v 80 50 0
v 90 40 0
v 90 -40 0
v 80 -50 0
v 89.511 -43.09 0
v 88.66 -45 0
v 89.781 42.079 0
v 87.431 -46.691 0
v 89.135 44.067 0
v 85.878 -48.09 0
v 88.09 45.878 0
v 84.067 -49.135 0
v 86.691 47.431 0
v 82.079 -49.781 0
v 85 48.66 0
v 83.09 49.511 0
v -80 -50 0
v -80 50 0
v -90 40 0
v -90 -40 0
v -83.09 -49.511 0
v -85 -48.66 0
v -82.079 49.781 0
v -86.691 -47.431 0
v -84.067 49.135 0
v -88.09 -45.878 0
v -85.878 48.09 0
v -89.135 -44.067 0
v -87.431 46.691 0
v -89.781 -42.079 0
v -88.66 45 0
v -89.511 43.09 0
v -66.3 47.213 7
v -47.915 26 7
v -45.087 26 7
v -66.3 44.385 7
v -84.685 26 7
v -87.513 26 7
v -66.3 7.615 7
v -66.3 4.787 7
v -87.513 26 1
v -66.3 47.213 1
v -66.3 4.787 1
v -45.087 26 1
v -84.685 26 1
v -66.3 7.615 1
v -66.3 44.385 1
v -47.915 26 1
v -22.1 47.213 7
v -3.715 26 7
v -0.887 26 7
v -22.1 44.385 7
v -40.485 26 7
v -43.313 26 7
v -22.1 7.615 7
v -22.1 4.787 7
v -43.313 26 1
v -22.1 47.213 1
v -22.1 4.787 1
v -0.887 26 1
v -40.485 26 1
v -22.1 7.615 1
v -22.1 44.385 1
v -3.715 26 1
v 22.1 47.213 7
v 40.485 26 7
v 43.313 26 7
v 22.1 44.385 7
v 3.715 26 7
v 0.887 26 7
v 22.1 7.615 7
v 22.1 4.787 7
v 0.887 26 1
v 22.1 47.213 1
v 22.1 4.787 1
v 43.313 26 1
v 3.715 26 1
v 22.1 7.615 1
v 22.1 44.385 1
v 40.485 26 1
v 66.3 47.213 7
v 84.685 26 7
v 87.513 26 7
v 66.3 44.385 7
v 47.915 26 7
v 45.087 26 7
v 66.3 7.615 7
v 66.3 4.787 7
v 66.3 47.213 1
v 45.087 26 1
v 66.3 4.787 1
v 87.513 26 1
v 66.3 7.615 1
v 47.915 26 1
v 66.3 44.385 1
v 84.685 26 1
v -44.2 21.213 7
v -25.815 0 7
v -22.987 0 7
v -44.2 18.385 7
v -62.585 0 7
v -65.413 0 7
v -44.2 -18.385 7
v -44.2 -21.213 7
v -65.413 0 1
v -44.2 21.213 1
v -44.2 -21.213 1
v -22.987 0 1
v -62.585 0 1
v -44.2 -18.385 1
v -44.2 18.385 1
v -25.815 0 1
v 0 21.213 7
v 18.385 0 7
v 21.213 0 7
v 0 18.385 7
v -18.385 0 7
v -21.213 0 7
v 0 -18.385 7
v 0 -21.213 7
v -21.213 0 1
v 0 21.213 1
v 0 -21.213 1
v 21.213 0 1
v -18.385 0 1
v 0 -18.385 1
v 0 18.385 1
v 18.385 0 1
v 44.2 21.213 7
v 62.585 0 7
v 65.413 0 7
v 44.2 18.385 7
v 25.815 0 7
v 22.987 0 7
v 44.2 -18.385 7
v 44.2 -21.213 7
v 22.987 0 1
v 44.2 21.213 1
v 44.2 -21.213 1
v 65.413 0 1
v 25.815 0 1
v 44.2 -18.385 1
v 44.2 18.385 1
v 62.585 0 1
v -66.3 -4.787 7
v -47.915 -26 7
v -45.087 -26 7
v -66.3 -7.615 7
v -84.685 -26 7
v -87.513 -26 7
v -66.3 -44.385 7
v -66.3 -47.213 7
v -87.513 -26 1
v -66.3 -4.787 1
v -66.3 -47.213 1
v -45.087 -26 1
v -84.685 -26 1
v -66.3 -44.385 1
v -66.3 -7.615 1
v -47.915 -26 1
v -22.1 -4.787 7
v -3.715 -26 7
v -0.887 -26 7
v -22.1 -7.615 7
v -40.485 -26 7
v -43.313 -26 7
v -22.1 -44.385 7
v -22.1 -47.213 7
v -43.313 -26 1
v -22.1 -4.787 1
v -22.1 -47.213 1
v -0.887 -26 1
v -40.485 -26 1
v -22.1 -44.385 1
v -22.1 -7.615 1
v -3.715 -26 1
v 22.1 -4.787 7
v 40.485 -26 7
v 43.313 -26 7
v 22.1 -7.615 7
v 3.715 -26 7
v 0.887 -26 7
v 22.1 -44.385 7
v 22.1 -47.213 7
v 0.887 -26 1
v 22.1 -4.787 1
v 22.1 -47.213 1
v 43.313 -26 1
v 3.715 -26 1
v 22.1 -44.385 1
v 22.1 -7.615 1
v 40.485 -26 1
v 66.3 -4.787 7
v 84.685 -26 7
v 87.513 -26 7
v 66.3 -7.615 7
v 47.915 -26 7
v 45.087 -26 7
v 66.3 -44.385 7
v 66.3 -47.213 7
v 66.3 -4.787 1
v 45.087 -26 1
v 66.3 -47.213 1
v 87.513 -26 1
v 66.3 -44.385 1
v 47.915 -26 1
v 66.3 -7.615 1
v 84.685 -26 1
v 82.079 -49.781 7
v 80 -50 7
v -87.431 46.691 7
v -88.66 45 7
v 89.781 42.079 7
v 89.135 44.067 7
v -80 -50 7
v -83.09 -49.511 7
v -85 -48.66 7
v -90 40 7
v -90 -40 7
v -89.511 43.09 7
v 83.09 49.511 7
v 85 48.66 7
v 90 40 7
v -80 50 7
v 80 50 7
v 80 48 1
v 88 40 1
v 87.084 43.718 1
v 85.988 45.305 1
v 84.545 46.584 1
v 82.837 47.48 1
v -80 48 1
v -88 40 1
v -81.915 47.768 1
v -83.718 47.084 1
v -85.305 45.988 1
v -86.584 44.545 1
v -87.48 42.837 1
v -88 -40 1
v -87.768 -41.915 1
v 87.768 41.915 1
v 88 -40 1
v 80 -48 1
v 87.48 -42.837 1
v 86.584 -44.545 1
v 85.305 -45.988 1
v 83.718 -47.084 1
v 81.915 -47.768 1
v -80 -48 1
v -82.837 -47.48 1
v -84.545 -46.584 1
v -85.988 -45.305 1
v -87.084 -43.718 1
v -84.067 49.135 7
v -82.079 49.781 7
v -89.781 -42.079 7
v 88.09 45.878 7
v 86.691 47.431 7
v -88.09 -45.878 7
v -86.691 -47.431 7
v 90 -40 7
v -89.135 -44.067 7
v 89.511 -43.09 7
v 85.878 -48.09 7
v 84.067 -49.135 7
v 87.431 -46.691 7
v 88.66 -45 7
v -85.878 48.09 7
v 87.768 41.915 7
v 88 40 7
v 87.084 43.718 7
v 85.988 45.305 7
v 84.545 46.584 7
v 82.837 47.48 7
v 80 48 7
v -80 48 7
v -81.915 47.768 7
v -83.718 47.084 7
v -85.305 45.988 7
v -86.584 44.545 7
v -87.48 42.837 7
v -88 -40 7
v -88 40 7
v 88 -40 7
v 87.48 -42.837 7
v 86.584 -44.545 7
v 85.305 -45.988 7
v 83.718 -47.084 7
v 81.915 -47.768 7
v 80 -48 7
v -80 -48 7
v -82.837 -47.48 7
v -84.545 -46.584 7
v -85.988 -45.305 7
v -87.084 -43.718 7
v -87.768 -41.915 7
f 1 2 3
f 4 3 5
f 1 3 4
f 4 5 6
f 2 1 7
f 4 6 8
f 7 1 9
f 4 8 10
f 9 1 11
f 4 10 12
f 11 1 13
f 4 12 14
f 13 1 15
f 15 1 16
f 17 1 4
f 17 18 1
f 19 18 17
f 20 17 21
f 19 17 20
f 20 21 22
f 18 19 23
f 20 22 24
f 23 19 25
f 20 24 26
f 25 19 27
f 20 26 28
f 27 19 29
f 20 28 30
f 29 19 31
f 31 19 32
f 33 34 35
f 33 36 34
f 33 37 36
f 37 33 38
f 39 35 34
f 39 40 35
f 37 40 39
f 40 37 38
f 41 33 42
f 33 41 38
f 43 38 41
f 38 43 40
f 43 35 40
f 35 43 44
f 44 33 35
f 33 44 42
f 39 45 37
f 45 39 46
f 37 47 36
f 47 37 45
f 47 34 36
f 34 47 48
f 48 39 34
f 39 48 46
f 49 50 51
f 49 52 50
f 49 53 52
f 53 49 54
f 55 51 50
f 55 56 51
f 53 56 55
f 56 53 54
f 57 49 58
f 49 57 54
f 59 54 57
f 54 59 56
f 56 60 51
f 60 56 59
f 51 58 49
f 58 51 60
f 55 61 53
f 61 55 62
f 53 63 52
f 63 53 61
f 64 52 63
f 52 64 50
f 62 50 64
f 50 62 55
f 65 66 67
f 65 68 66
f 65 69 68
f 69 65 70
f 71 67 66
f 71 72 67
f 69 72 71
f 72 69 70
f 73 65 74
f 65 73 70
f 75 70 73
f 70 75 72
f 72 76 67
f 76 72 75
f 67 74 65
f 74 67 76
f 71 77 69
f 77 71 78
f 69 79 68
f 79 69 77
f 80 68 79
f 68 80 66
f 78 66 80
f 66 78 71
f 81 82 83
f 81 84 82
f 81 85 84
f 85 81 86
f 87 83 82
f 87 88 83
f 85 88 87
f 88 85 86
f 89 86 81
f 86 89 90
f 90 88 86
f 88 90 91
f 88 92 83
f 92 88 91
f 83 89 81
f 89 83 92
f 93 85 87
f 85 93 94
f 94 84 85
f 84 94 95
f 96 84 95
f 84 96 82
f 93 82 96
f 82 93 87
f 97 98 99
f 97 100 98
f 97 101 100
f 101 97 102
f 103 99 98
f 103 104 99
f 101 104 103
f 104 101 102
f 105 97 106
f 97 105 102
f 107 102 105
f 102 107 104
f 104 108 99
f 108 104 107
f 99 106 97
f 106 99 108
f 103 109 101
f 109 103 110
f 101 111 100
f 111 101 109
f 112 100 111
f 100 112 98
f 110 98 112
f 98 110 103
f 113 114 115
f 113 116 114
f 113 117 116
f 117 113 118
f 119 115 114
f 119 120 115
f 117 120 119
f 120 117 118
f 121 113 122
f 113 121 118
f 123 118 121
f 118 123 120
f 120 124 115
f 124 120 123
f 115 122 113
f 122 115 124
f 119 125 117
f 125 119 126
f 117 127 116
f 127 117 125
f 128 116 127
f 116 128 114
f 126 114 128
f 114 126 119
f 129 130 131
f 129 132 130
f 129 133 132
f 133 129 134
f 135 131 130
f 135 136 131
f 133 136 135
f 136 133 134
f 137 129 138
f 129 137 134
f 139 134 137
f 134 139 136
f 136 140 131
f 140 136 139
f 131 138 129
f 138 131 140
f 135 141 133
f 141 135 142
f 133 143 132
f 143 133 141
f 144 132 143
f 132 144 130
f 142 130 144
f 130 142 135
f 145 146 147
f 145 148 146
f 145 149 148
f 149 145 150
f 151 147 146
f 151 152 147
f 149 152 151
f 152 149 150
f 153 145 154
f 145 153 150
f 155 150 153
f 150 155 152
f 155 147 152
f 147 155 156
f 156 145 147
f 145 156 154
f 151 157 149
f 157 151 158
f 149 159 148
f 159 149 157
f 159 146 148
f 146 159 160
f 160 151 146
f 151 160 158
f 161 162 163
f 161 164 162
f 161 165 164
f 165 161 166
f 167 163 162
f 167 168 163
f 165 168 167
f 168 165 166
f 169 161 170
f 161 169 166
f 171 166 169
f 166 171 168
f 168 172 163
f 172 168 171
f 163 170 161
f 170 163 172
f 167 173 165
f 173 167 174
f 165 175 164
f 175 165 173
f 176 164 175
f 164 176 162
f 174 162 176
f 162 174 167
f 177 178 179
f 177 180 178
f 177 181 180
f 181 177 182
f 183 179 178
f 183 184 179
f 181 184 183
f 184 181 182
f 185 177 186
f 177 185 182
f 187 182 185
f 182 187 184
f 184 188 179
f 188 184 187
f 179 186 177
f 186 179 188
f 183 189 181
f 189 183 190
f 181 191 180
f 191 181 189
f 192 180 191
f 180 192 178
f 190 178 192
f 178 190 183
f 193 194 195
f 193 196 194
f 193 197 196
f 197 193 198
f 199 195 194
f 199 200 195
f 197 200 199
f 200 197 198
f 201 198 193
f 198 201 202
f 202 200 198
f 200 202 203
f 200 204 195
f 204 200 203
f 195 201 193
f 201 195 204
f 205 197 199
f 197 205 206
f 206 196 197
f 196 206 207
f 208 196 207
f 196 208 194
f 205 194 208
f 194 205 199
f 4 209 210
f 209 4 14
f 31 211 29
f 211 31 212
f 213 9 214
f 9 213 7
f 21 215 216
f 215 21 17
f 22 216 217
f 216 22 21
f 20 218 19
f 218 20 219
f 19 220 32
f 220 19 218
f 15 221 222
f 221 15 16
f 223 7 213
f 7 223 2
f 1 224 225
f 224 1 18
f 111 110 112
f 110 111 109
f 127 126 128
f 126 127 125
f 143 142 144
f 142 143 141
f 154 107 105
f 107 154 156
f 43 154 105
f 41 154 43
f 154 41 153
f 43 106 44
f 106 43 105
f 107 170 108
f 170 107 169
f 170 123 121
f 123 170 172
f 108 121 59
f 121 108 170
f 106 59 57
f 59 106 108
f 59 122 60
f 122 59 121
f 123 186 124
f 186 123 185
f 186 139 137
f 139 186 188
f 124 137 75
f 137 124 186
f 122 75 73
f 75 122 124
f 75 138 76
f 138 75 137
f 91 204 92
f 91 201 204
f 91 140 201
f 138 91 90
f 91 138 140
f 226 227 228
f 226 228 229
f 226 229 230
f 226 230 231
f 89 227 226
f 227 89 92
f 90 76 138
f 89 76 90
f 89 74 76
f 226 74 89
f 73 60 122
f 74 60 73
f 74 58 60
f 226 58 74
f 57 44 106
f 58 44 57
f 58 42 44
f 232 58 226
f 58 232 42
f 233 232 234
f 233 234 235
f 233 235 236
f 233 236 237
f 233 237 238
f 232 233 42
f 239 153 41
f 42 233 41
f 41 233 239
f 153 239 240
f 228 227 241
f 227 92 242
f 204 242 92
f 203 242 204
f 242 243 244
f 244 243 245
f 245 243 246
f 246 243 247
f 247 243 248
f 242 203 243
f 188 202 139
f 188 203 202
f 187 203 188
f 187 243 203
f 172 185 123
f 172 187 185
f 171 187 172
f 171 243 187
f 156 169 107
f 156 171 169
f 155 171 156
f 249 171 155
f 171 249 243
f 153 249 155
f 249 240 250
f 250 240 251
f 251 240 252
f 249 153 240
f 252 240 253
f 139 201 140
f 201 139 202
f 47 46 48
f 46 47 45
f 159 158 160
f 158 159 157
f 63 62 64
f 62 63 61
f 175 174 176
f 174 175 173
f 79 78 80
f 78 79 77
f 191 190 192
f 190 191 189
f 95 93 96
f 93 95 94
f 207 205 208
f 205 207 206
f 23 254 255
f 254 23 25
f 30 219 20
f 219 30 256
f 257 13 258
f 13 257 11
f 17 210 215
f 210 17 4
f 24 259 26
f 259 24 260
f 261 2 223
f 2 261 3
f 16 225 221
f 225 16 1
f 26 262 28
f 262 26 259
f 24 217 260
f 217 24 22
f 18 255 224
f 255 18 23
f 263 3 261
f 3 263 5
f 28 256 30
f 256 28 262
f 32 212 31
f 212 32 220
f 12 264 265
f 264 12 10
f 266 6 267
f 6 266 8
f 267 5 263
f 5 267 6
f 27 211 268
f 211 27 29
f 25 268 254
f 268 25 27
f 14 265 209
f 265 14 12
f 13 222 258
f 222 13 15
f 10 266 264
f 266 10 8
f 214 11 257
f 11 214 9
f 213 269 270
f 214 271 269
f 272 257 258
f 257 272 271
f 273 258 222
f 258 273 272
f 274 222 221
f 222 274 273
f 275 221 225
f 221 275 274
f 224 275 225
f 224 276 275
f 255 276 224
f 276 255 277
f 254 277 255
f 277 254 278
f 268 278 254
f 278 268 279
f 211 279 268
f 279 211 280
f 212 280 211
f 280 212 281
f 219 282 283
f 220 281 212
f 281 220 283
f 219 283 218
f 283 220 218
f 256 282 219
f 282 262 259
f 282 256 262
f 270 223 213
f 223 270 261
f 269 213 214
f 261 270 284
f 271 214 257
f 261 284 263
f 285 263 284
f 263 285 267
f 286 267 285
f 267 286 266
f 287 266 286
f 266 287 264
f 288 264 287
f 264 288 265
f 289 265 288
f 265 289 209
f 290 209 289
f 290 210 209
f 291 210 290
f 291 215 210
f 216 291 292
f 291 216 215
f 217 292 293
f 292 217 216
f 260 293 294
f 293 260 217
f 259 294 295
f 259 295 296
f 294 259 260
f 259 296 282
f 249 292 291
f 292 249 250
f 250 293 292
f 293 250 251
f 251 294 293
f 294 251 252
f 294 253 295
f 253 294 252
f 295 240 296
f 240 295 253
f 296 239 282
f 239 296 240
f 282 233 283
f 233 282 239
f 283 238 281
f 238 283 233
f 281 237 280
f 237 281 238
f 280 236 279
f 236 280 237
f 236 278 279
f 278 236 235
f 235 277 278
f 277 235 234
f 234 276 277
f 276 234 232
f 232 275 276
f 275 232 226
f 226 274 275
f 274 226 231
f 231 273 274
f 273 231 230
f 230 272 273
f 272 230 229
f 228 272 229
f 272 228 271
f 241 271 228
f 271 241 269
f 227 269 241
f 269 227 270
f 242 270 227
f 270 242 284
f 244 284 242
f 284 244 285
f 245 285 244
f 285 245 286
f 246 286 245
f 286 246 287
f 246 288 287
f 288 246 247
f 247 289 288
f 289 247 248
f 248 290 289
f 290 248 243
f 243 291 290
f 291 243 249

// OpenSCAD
/*[global settings]*/
//thickness of wall
inner_wall = 2; 
//dimension of inner square
inner_square = 26;
//height (including base height)
height = 7;
//thickness of base
base_height = 1;
//horizontal spacing
spacing_x = 1.7;
//vertical spacing
spacing_y = 1 ;

//length of base
outer_x = 160;
//breadth of base
outer_y = 80;
 
linear_extrude(base_height) 
offset(r= 10)
square([outer_x, outer_y], true);

linear_extrude(height)
difference(){
offset(r= 10)
square([outer_x, outer_y], true);
offset(r= 10-inner_wall )
square([outer_x, outer_y], true);
}

//row 3
for (i=[-1.5:1:1.5] ){
    offset = i*spacing_x*inner_square;
    translate([offset, spacing_y*inner_square, 0])
    base_shell();
}
//  row 2
for (i=[-1:1:1] ){
    offset = i*spacing_x*inner_square;
    translate([offset, 0,0])
    base_shell();
}  
//  row 1
for (i=[-1.5:1:1.5] ){
    offset = i*spacing_x*inner_square;
    translate([offset, -spacing_y*inner_square,0])
    base_shell();
}


module base_shell(){
    
    outer = inner_square + 2*inner_wall;
    rotate(45)
    linear_extrude(height)
    difference(){
    square([outer, outer],  true);
    square([inner_square, inner_square], true);
    } 
}
